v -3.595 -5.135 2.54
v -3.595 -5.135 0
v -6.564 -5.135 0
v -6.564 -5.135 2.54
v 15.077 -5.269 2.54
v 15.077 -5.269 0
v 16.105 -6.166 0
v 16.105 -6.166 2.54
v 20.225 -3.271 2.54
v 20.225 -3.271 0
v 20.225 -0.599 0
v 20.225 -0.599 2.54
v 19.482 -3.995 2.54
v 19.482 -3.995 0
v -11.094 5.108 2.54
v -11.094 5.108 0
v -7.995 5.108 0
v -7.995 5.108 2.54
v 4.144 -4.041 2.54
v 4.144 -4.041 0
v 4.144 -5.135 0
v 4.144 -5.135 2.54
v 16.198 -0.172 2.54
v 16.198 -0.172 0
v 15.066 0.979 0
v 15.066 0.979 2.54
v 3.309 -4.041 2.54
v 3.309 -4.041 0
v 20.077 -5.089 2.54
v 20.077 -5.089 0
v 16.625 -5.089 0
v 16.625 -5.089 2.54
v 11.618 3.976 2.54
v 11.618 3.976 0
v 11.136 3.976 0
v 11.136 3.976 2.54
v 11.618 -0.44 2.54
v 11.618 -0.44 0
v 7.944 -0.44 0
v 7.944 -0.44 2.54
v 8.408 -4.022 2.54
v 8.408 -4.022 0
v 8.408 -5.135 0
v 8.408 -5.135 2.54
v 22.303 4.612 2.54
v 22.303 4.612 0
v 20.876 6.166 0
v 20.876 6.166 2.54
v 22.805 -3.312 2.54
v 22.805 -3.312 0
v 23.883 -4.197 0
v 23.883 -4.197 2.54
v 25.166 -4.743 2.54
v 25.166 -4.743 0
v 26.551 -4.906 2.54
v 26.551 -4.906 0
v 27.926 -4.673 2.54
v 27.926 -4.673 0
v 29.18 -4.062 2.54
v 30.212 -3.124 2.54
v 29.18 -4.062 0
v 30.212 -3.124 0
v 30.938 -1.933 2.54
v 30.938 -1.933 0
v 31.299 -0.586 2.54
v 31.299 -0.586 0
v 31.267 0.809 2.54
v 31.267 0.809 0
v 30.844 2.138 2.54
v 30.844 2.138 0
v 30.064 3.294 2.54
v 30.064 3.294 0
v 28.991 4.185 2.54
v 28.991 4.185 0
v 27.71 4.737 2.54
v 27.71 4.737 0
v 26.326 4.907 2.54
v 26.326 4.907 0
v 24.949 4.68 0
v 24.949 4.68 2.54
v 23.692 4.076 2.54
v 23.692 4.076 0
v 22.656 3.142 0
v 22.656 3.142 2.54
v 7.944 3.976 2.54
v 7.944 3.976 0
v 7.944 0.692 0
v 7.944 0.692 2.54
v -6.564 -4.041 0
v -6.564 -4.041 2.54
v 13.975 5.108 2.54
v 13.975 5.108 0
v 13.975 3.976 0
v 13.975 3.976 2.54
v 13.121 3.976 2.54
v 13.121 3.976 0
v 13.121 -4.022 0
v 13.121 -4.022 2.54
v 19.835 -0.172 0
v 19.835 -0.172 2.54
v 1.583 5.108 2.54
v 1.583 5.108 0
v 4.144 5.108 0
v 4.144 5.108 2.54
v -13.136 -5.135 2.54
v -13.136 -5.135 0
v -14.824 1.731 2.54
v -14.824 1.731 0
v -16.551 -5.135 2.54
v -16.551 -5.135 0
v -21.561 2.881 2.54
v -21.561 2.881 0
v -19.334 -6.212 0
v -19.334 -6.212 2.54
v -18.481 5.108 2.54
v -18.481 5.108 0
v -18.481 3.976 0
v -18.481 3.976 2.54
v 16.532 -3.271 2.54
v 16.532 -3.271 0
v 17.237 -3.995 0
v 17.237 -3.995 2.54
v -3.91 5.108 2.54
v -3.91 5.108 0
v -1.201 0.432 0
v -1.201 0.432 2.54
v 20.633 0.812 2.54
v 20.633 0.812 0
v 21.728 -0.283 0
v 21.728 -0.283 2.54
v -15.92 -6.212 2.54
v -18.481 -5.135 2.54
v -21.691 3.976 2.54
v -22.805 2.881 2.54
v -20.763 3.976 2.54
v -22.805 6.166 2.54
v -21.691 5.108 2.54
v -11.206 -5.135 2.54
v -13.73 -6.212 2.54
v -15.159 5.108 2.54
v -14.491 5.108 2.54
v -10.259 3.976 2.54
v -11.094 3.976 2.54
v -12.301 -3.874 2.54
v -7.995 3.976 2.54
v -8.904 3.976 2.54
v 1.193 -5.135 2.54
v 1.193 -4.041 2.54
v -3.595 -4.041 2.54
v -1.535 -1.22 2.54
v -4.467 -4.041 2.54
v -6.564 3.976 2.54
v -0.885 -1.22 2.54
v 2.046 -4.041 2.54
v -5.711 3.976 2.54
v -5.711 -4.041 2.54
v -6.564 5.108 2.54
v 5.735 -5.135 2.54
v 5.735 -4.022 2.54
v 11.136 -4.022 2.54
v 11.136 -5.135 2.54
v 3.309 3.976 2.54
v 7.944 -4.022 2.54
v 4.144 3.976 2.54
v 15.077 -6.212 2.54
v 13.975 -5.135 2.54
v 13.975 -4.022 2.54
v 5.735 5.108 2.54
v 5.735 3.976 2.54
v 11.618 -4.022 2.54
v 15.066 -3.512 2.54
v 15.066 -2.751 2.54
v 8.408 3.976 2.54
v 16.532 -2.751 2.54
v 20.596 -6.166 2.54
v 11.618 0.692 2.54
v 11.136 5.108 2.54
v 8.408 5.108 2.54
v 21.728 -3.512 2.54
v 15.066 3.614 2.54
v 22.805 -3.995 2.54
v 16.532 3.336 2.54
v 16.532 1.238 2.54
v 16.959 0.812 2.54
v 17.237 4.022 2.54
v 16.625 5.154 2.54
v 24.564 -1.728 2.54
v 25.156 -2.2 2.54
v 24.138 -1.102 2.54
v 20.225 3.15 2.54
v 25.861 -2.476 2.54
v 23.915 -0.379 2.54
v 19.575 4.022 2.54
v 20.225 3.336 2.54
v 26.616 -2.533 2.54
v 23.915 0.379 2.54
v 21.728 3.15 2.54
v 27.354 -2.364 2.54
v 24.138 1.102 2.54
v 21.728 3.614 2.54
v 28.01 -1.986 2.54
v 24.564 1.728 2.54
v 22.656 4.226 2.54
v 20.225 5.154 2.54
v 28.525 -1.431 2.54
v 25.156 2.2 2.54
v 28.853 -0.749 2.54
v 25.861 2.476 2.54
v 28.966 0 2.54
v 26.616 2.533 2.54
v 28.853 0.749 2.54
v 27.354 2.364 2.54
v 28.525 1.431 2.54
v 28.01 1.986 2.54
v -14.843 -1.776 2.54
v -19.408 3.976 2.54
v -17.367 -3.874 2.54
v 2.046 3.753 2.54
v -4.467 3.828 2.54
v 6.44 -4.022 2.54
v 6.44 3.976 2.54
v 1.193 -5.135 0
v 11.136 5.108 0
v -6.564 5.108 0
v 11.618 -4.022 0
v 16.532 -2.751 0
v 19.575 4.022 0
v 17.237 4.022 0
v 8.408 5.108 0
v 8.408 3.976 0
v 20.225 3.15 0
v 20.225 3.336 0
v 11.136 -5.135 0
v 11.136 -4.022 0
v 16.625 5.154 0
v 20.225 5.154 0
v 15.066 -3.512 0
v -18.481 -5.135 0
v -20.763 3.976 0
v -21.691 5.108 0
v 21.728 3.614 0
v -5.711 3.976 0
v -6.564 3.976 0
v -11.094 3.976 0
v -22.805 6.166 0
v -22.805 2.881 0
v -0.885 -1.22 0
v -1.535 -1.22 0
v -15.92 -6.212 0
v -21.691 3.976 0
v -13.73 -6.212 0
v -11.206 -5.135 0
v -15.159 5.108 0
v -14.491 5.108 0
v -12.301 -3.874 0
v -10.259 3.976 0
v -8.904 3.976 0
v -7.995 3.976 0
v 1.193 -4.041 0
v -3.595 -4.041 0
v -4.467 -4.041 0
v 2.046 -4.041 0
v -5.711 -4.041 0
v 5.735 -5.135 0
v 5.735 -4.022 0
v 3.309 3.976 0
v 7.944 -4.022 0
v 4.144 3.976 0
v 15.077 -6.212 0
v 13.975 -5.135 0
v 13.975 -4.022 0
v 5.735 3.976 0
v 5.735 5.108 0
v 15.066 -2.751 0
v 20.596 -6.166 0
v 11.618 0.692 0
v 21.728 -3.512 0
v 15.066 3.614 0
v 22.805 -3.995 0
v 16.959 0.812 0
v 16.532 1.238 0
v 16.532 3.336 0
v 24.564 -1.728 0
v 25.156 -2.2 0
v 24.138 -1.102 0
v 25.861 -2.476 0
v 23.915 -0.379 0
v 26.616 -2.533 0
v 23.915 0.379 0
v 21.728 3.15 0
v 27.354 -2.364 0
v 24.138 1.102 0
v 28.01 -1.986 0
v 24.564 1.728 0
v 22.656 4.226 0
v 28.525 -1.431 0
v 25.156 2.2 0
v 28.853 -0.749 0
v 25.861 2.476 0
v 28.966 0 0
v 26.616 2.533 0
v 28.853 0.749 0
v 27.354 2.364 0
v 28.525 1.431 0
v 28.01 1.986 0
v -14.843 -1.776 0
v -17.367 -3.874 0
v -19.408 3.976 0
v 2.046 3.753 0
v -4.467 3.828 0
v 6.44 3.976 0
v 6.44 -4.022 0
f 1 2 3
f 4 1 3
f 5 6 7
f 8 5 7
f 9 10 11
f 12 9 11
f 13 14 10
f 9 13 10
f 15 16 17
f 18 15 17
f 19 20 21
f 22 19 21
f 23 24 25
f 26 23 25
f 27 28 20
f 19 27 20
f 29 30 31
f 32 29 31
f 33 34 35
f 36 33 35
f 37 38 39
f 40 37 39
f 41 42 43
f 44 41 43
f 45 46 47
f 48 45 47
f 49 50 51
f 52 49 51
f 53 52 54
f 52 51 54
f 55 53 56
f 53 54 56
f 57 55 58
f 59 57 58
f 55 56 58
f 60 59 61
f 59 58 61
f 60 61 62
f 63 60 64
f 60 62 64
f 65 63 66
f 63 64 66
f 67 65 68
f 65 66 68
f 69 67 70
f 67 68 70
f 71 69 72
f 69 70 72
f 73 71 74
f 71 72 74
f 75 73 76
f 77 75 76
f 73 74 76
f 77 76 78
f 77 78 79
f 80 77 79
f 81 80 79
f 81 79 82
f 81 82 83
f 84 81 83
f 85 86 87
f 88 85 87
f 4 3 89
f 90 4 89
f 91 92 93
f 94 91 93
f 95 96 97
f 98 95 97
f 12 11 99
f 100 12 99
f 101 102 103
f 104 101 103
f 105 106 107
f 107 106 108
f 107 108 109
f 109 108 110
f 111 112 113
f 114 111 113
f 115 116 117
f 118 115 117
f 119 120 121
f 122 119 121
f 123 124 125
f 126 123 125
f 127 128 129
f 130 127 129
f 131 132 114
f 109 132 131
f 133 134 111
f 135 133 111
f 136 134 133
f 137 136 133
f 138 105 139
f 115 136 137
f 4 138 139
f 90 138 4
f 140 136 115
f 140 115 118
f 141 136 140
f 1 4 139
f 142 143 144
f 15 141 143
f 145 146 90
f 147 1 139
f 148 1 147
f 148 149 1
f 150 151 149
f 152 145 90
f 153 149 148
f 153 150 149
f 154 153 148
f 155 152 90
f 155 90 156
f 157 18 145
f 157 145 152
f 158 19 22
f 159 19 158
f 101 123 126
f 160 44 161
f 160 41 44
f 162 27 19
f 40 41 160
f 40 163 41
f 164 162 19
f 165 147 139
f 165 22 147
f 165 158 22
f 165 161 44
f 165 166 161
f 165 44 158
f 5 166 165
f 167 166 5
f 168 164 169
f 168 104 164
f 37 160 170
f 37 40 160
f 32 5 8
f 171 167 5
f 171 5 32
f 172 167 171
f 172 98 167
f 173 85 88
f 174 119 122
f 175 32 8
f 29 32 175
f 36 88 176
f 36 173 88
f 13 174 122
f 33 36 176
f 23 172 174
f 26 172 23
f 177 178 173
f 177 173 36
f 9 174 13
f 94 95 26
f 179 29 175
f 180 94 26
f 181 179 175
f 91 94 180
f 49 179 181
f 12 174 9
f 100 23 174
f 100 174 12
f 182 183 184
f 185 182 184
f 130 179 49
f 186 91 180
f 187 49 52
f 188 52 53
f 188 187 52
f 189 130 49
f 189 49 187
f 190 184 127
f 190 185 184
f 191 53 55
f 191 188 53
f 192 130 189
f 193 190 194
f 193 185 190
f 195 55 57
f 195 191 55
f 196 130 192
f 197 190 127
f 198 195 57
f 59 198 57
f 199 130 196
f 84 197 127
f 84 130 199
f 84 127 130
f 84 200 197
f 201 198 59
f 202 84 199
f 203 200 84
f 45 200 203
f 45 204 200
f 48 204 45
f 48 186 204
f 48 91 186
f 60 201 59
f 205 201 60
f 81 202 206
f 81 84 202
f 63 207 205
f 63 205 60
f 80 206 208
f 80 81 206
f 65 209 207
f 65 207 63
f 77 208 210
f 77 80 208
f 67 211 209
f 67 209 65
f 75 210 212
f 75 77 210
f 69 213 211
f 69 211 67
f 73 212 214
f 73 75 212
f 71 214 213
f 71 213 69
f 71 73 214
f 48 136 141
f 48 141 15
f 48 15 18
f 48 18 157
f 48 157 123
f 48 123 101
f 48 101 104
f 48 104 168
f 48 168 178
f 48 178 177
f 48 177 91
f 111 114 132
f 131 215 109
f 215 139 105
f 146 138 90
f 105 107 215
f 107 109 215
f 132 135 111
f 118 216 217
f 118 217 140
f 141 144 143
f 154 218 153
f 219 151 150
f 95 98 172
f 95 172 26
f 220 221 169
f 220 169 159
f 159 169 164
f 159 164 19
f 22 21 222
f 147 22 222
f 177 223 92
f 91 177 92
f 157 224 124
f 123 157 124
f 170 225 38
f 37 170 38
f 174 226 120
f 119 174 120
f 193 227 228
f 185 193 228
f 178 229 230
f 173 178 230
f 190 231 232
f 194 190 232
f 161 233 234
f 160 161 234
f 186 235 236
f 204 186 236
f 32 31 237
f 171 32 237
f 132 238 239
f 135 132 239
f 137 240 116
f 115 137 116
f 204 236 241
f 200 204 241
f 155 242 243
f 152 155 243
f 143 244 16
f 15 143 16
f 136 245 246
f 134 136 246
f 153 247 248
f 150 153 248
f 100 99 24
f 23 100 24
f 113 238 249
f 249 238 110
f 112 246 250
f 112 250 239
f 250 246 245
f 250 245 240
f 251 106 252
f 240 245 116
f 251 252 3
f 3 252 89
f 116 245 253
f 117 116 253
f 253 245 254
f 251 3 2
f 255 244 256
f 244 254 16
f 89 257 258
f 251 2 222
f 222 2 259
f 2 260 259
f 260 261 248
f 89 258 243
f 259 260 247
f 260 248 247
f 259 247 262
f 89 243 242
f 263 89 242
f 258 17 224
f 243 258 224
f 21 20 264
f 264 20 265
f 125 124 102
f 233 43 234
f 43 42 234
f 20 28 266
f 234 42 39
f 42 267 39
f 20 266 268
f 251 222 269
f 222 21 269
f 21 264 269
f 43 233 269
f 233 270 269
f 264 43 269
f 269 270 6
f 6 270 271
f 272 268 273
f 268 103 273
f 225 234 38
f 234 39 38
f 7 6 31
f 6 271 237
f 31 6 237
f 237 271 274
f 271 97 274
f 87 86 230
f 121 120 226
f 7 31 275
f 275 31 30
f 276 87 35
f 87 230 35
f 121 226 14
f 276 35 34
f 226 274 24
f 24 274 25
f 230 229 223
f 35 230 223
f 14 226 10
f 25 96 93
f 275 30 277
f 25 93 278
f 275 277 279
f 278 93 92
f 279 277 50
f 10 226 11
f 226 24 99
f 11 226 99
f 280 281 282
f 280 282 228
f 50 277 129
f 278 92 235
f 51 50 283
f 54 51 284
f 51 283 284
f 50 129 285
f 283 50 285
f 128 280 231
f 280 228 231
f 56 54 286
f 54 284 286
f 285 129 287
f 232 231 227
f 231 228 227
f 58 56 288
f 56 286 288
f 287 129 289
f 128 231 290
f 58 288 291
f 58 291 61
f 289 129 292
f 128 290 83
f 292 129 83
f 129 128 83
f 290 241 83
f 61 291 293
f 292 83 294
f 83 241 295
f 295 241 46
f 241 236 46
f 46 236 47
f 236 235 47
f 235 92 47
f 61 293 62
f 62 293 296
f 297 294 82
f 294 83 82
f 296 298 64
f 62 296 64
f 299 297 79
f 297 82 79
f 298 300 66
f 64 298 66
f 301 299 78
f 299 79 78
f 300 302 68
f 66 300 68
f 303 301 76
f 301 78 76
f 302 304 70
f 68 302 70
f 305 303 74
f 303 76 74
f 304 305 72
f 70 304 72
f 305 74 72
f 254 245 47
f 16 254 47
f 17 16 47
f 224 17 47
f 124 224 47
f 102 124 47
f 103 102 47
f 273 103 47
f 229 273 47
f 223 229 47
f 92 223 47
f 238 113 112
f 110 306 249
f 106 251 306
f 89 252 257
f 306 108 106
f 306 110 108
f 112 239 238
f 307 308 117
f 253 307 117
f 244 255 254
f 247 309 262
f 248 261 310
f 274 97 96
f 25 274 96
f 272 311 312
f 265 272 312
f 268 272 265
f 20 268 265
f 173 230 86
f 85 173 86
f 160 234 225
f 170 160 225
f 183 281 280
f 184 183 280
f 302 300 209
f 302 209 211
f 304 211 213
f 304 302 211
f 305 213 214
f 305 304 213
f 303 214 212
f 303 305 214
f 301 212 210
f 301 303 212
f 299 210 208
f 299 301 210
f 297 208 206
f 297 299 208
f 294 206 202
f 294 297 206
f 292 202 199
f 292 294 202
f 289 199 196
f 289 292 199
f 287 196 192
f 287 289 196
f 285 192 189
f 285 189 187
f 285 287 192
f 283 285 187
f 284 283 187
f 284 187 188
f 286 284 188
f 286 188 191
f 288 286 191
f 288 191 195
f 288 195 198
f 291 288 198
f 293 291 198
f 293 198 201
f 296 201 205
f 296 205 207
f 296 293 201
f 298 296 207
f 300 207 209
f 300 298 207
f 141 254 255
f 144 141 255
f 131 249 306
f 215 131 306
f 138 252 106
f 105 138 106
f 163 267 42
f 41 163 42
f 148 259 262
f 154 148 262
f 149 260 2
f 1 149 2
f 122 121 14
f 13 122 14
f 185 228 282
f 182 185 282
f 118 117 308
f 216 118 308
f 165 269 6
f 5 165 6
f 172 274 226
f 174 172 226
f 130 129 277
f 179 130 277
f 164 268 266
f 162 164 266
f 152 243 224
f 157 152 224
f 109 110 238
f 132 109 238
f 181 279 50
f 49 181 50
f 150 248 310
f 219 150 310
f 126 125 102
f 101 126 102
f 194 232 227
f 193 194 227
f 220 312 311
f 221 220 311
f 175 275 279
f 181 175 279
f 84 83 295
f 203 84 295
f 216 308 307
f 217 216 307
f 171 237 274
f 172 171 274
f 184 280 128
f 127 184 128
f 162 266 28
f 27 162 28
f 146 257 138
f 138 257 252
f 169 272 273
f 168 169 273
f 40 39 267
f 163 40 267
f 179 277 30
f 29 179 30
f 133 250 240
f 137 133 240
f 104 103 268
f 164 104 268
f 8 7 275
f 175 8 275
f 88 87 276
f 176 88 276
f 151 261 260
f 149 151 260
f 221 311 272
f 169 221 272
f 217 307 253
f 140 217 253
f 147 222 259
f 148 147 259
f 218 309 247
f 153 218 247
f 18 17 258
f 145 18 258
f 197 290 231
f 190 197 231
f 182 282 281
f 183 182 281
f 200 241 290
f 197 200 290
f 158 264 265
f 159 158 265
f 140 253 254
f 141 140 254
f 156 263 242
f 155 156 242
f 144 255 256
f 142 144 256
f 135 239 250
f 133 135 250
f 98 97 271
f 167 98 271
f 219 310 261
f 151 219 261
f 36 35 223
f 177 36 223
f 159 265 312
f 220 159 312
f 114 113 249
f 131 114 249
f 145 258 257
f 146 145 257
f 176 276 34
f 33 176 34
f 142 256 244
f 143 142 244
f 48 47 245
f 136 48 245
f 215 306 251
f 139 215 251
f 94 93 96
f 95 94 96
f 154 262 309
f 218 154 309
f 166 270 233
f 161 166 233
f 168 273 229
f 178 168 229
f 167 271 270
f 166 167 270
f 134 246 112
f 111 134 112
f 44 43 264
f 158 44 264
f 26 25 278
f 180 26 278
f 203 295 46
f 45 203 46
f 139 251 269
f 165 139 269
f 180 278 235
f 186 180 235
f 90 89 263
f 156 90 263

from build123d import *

# Parameters (mm, degrees)
F0_R     = 2.54
F1_DEPTH = 2.54


with BuildPart() as f1:
    # F0 (on Top) → F1 (new body)
    with BuildSketch(Plane.XY):
        with BuildLine():
            Line((-13.72965, -6.211935), (-10.352021, -6.211935))
            Line((-10.352021, -6.211935), (-7.658862, -6.211935))
            Line((-7.658862, -6.211935), (-2.500108, -6.211935))
            Line((-2.500108, -6.211935), (0.098243, -6.211935))
            Line((0.098243, -6.211935), (4.492023, -6.211935))
            Line((4.492023, -6.211935), (5.238309, -6.211935))
            Line((5.238309, -6.211935), (9.521089, -6.211935))
            Line((9.521089, -6.211935), (10.040419, -6.211935))
            Line((10.040419, -6.211935), (15.077152, -6.211935))
            Line((15.077152, -6.211935), (15.077152, -5.268871))
            Line((15.077152, -5.268871), (16.105427, -6.165902))
            Line((16.105427, -6.165902), (20.595906, -6.165902))
            Line((20.595906, -6.165902), (22.804618, -3.994572))
            Line((22.804618, -3.994572), (22.804618, -3.312337))
            ThreePointArc((22.804618, -3.312337), (31.332733, 0.11279), (22.656238, 3.142425))
            Line((22.656238, 3.142425), (22.656238, 4.226365))
            Line((22.656238, 4.226365), (22.302699, 4.611585))
            Line((22.302699, 4.611585), (20.876208, 6.165907))
            Line((20.876208, 6.165907), (15.069485, 6.165907))
            Line((15.069485, 6.165907), (10.040419, 6.165907))
            Line((10.040419, 6.165907), (9.521089, 6.165907))
            Line((9.521089, 6.165907), (5.238309, 6.165907))
            Line((5.238309, 6.165907), (4.492023, 6.165907))
            Line((4.492023, 6.165907), (1.025901, 6.165907))
            Line((1.025901, 6.165907), (-3.409077, 6.165907))
            Line((-3.409077, 6.165907), (-6.900202, 6.165907))
            Line((-6.900202, 6.165907), (-7.658862, 6.165907))
            Line((-7.658862, 6.165907), (-12.207904, 6.165907))
            Line((-12.207904, 6.165907), (-13.72965, 6.165907))
            Line((-13.72965, 6.165907), (-15.919671, 6.165907))
            Line((-15.919671, 6.165907), (-17.367226, 6.165907))
            Line((-17.367226, 6.165907), (-22.804618, 6.165907))
            Line((-22.804618, 6.165907), (-22.804618, 2.881158))
            Line((-22.804618, 2.881158), (-21.560945, 2.881158))
            Line((-21.560945, 2.881158), (-19.33411, -6.211935))
            Line((-19.33411, -6.211935), (-15.919671, -6.211935))
            Line((-15.919671, -6.211935), (-14.843066, -1.776392))
            Line((-14.843066, -1.776392), (-13.72965, -6.211935))
        make_face()
        Polygon((-11.094488, 5.107989), (-7.995496, 5.107989), (-7.995496, 3.976453), (-8.904465, 3.976453), (-11.206055, -5.13533), (-13.135563, -5.13533), (-14.824377, 1.730931), (-16.550569, -5.13533), (-18.480642, -5.13533), (-20.762977, 3.976453), (-21.691201, 3.976453), (-21.691201, 5.107989), (-18.480642, 5.107989), (-18.480642, 3.976453), (-19.408301, 3.976453), (-17.367226, -3.873531), (-15.158514, 5.107989), (-14.490804, 5.107989), (-12.300784, -3.873531), (-10.259141, 3.976453), (-11.094488, 3.976453), align=None, mode=Mode.SUBTRACT)
        Polygon((1.58261, 5.107989), (4.143582, 5.107989), (4.143582, 3.976453), (3.308802, 3.976453), (3.308802, -4.040601), (4.143582, -4.040601), (4.143582, -5.13533), (1.19297, -5.13533), (1.19297, -4.040601), (2.046439, -4.040601), (2.046439, 3.753313), (-0.885484, -1.219681), (-1.535071, -1.219681), (-4.466992, 3.827508), (-4.466992, -4.040601), (-3.594835, -4.040601), (-3.594835, -5.13533), (-6.564135, -5.13533), (-6.564135, -4.040601), (-5.710667, -4.040601), (-5.710667, 3.976453), (-6.564135, 3.976453), (-6.564135, 5.107989), (-3.910285, 5.107989), (-1.200932, 0.431753), align=None, mode=Mode.SUBTRACT)
        Polygon((11.135711, 5.107989), (13.974756, 5.107989), (13.974756, 3.976453), (13.121286, 3.976453), (13.121286, -4.021916), (13.974756, -4.021916), (13.974756, -5.13533), (11.135711, -5.13533), (11.135711, -4.021916), (11.618231, -4.021916), (11.618231, -0.440402), (7.943841, -0.440402), (7.943841, -4.021916), (8.40767, -4.021916), (8.40767, -5.13533), (5.735131, -5.13533), (5.735131, -4.021916), (6.44022, -4.021916), (6.44022, 3.976453), (5.735131, 3.976453), (5.735131, 5.107989), (8.40767, 5.107989), (8.40767, 3.976453), (7.943841, 3.976453), (7.943841, 0.691705), (11.618231, 0.691705), (11.618231, 3.976453), (11.135711, 3.976453), align=None, mode=Mode.SUBTRACT)
        Polygon((20.633285, 0.811923), (21.728014, -0.283368), (21.728014, -3.512052), (20.076579, -5.089298), (16.624759, -5.089298), (15.065635, -3.512052), (15.065635, -2.751466), (16.531877, -2.751466), (16.531877, -3.270793), (17.236968, -3.994572), (19.48249, -3.994572), (20.224959, -3.270793), (20.224959, -0.598818), (19.835318, -0.171801), (16.197742, -0.171801), (15.065635, 0.978994), (15.065635, 3.614156), (16.624759, 5.154023), (20.224959, 5.154023), (21.728014, 3.614156), (21.728014, 3.150327), (20.224959, 3.150327), (20.224959, 3.335517), (19.575371, 4.022482), (17.236968, 4.022482), (16.531877, 3.335517), (16.531877, 1.238374), (16.958896, 0.811923), align=None, mode=Mode.SUBTRACT)
        with Locations((26.426162, 0)):
            Circle(F0_R, mode=Mode.SUBTRACT)
    extrude(amount=F1_DEPTH)


solid = f1.part
